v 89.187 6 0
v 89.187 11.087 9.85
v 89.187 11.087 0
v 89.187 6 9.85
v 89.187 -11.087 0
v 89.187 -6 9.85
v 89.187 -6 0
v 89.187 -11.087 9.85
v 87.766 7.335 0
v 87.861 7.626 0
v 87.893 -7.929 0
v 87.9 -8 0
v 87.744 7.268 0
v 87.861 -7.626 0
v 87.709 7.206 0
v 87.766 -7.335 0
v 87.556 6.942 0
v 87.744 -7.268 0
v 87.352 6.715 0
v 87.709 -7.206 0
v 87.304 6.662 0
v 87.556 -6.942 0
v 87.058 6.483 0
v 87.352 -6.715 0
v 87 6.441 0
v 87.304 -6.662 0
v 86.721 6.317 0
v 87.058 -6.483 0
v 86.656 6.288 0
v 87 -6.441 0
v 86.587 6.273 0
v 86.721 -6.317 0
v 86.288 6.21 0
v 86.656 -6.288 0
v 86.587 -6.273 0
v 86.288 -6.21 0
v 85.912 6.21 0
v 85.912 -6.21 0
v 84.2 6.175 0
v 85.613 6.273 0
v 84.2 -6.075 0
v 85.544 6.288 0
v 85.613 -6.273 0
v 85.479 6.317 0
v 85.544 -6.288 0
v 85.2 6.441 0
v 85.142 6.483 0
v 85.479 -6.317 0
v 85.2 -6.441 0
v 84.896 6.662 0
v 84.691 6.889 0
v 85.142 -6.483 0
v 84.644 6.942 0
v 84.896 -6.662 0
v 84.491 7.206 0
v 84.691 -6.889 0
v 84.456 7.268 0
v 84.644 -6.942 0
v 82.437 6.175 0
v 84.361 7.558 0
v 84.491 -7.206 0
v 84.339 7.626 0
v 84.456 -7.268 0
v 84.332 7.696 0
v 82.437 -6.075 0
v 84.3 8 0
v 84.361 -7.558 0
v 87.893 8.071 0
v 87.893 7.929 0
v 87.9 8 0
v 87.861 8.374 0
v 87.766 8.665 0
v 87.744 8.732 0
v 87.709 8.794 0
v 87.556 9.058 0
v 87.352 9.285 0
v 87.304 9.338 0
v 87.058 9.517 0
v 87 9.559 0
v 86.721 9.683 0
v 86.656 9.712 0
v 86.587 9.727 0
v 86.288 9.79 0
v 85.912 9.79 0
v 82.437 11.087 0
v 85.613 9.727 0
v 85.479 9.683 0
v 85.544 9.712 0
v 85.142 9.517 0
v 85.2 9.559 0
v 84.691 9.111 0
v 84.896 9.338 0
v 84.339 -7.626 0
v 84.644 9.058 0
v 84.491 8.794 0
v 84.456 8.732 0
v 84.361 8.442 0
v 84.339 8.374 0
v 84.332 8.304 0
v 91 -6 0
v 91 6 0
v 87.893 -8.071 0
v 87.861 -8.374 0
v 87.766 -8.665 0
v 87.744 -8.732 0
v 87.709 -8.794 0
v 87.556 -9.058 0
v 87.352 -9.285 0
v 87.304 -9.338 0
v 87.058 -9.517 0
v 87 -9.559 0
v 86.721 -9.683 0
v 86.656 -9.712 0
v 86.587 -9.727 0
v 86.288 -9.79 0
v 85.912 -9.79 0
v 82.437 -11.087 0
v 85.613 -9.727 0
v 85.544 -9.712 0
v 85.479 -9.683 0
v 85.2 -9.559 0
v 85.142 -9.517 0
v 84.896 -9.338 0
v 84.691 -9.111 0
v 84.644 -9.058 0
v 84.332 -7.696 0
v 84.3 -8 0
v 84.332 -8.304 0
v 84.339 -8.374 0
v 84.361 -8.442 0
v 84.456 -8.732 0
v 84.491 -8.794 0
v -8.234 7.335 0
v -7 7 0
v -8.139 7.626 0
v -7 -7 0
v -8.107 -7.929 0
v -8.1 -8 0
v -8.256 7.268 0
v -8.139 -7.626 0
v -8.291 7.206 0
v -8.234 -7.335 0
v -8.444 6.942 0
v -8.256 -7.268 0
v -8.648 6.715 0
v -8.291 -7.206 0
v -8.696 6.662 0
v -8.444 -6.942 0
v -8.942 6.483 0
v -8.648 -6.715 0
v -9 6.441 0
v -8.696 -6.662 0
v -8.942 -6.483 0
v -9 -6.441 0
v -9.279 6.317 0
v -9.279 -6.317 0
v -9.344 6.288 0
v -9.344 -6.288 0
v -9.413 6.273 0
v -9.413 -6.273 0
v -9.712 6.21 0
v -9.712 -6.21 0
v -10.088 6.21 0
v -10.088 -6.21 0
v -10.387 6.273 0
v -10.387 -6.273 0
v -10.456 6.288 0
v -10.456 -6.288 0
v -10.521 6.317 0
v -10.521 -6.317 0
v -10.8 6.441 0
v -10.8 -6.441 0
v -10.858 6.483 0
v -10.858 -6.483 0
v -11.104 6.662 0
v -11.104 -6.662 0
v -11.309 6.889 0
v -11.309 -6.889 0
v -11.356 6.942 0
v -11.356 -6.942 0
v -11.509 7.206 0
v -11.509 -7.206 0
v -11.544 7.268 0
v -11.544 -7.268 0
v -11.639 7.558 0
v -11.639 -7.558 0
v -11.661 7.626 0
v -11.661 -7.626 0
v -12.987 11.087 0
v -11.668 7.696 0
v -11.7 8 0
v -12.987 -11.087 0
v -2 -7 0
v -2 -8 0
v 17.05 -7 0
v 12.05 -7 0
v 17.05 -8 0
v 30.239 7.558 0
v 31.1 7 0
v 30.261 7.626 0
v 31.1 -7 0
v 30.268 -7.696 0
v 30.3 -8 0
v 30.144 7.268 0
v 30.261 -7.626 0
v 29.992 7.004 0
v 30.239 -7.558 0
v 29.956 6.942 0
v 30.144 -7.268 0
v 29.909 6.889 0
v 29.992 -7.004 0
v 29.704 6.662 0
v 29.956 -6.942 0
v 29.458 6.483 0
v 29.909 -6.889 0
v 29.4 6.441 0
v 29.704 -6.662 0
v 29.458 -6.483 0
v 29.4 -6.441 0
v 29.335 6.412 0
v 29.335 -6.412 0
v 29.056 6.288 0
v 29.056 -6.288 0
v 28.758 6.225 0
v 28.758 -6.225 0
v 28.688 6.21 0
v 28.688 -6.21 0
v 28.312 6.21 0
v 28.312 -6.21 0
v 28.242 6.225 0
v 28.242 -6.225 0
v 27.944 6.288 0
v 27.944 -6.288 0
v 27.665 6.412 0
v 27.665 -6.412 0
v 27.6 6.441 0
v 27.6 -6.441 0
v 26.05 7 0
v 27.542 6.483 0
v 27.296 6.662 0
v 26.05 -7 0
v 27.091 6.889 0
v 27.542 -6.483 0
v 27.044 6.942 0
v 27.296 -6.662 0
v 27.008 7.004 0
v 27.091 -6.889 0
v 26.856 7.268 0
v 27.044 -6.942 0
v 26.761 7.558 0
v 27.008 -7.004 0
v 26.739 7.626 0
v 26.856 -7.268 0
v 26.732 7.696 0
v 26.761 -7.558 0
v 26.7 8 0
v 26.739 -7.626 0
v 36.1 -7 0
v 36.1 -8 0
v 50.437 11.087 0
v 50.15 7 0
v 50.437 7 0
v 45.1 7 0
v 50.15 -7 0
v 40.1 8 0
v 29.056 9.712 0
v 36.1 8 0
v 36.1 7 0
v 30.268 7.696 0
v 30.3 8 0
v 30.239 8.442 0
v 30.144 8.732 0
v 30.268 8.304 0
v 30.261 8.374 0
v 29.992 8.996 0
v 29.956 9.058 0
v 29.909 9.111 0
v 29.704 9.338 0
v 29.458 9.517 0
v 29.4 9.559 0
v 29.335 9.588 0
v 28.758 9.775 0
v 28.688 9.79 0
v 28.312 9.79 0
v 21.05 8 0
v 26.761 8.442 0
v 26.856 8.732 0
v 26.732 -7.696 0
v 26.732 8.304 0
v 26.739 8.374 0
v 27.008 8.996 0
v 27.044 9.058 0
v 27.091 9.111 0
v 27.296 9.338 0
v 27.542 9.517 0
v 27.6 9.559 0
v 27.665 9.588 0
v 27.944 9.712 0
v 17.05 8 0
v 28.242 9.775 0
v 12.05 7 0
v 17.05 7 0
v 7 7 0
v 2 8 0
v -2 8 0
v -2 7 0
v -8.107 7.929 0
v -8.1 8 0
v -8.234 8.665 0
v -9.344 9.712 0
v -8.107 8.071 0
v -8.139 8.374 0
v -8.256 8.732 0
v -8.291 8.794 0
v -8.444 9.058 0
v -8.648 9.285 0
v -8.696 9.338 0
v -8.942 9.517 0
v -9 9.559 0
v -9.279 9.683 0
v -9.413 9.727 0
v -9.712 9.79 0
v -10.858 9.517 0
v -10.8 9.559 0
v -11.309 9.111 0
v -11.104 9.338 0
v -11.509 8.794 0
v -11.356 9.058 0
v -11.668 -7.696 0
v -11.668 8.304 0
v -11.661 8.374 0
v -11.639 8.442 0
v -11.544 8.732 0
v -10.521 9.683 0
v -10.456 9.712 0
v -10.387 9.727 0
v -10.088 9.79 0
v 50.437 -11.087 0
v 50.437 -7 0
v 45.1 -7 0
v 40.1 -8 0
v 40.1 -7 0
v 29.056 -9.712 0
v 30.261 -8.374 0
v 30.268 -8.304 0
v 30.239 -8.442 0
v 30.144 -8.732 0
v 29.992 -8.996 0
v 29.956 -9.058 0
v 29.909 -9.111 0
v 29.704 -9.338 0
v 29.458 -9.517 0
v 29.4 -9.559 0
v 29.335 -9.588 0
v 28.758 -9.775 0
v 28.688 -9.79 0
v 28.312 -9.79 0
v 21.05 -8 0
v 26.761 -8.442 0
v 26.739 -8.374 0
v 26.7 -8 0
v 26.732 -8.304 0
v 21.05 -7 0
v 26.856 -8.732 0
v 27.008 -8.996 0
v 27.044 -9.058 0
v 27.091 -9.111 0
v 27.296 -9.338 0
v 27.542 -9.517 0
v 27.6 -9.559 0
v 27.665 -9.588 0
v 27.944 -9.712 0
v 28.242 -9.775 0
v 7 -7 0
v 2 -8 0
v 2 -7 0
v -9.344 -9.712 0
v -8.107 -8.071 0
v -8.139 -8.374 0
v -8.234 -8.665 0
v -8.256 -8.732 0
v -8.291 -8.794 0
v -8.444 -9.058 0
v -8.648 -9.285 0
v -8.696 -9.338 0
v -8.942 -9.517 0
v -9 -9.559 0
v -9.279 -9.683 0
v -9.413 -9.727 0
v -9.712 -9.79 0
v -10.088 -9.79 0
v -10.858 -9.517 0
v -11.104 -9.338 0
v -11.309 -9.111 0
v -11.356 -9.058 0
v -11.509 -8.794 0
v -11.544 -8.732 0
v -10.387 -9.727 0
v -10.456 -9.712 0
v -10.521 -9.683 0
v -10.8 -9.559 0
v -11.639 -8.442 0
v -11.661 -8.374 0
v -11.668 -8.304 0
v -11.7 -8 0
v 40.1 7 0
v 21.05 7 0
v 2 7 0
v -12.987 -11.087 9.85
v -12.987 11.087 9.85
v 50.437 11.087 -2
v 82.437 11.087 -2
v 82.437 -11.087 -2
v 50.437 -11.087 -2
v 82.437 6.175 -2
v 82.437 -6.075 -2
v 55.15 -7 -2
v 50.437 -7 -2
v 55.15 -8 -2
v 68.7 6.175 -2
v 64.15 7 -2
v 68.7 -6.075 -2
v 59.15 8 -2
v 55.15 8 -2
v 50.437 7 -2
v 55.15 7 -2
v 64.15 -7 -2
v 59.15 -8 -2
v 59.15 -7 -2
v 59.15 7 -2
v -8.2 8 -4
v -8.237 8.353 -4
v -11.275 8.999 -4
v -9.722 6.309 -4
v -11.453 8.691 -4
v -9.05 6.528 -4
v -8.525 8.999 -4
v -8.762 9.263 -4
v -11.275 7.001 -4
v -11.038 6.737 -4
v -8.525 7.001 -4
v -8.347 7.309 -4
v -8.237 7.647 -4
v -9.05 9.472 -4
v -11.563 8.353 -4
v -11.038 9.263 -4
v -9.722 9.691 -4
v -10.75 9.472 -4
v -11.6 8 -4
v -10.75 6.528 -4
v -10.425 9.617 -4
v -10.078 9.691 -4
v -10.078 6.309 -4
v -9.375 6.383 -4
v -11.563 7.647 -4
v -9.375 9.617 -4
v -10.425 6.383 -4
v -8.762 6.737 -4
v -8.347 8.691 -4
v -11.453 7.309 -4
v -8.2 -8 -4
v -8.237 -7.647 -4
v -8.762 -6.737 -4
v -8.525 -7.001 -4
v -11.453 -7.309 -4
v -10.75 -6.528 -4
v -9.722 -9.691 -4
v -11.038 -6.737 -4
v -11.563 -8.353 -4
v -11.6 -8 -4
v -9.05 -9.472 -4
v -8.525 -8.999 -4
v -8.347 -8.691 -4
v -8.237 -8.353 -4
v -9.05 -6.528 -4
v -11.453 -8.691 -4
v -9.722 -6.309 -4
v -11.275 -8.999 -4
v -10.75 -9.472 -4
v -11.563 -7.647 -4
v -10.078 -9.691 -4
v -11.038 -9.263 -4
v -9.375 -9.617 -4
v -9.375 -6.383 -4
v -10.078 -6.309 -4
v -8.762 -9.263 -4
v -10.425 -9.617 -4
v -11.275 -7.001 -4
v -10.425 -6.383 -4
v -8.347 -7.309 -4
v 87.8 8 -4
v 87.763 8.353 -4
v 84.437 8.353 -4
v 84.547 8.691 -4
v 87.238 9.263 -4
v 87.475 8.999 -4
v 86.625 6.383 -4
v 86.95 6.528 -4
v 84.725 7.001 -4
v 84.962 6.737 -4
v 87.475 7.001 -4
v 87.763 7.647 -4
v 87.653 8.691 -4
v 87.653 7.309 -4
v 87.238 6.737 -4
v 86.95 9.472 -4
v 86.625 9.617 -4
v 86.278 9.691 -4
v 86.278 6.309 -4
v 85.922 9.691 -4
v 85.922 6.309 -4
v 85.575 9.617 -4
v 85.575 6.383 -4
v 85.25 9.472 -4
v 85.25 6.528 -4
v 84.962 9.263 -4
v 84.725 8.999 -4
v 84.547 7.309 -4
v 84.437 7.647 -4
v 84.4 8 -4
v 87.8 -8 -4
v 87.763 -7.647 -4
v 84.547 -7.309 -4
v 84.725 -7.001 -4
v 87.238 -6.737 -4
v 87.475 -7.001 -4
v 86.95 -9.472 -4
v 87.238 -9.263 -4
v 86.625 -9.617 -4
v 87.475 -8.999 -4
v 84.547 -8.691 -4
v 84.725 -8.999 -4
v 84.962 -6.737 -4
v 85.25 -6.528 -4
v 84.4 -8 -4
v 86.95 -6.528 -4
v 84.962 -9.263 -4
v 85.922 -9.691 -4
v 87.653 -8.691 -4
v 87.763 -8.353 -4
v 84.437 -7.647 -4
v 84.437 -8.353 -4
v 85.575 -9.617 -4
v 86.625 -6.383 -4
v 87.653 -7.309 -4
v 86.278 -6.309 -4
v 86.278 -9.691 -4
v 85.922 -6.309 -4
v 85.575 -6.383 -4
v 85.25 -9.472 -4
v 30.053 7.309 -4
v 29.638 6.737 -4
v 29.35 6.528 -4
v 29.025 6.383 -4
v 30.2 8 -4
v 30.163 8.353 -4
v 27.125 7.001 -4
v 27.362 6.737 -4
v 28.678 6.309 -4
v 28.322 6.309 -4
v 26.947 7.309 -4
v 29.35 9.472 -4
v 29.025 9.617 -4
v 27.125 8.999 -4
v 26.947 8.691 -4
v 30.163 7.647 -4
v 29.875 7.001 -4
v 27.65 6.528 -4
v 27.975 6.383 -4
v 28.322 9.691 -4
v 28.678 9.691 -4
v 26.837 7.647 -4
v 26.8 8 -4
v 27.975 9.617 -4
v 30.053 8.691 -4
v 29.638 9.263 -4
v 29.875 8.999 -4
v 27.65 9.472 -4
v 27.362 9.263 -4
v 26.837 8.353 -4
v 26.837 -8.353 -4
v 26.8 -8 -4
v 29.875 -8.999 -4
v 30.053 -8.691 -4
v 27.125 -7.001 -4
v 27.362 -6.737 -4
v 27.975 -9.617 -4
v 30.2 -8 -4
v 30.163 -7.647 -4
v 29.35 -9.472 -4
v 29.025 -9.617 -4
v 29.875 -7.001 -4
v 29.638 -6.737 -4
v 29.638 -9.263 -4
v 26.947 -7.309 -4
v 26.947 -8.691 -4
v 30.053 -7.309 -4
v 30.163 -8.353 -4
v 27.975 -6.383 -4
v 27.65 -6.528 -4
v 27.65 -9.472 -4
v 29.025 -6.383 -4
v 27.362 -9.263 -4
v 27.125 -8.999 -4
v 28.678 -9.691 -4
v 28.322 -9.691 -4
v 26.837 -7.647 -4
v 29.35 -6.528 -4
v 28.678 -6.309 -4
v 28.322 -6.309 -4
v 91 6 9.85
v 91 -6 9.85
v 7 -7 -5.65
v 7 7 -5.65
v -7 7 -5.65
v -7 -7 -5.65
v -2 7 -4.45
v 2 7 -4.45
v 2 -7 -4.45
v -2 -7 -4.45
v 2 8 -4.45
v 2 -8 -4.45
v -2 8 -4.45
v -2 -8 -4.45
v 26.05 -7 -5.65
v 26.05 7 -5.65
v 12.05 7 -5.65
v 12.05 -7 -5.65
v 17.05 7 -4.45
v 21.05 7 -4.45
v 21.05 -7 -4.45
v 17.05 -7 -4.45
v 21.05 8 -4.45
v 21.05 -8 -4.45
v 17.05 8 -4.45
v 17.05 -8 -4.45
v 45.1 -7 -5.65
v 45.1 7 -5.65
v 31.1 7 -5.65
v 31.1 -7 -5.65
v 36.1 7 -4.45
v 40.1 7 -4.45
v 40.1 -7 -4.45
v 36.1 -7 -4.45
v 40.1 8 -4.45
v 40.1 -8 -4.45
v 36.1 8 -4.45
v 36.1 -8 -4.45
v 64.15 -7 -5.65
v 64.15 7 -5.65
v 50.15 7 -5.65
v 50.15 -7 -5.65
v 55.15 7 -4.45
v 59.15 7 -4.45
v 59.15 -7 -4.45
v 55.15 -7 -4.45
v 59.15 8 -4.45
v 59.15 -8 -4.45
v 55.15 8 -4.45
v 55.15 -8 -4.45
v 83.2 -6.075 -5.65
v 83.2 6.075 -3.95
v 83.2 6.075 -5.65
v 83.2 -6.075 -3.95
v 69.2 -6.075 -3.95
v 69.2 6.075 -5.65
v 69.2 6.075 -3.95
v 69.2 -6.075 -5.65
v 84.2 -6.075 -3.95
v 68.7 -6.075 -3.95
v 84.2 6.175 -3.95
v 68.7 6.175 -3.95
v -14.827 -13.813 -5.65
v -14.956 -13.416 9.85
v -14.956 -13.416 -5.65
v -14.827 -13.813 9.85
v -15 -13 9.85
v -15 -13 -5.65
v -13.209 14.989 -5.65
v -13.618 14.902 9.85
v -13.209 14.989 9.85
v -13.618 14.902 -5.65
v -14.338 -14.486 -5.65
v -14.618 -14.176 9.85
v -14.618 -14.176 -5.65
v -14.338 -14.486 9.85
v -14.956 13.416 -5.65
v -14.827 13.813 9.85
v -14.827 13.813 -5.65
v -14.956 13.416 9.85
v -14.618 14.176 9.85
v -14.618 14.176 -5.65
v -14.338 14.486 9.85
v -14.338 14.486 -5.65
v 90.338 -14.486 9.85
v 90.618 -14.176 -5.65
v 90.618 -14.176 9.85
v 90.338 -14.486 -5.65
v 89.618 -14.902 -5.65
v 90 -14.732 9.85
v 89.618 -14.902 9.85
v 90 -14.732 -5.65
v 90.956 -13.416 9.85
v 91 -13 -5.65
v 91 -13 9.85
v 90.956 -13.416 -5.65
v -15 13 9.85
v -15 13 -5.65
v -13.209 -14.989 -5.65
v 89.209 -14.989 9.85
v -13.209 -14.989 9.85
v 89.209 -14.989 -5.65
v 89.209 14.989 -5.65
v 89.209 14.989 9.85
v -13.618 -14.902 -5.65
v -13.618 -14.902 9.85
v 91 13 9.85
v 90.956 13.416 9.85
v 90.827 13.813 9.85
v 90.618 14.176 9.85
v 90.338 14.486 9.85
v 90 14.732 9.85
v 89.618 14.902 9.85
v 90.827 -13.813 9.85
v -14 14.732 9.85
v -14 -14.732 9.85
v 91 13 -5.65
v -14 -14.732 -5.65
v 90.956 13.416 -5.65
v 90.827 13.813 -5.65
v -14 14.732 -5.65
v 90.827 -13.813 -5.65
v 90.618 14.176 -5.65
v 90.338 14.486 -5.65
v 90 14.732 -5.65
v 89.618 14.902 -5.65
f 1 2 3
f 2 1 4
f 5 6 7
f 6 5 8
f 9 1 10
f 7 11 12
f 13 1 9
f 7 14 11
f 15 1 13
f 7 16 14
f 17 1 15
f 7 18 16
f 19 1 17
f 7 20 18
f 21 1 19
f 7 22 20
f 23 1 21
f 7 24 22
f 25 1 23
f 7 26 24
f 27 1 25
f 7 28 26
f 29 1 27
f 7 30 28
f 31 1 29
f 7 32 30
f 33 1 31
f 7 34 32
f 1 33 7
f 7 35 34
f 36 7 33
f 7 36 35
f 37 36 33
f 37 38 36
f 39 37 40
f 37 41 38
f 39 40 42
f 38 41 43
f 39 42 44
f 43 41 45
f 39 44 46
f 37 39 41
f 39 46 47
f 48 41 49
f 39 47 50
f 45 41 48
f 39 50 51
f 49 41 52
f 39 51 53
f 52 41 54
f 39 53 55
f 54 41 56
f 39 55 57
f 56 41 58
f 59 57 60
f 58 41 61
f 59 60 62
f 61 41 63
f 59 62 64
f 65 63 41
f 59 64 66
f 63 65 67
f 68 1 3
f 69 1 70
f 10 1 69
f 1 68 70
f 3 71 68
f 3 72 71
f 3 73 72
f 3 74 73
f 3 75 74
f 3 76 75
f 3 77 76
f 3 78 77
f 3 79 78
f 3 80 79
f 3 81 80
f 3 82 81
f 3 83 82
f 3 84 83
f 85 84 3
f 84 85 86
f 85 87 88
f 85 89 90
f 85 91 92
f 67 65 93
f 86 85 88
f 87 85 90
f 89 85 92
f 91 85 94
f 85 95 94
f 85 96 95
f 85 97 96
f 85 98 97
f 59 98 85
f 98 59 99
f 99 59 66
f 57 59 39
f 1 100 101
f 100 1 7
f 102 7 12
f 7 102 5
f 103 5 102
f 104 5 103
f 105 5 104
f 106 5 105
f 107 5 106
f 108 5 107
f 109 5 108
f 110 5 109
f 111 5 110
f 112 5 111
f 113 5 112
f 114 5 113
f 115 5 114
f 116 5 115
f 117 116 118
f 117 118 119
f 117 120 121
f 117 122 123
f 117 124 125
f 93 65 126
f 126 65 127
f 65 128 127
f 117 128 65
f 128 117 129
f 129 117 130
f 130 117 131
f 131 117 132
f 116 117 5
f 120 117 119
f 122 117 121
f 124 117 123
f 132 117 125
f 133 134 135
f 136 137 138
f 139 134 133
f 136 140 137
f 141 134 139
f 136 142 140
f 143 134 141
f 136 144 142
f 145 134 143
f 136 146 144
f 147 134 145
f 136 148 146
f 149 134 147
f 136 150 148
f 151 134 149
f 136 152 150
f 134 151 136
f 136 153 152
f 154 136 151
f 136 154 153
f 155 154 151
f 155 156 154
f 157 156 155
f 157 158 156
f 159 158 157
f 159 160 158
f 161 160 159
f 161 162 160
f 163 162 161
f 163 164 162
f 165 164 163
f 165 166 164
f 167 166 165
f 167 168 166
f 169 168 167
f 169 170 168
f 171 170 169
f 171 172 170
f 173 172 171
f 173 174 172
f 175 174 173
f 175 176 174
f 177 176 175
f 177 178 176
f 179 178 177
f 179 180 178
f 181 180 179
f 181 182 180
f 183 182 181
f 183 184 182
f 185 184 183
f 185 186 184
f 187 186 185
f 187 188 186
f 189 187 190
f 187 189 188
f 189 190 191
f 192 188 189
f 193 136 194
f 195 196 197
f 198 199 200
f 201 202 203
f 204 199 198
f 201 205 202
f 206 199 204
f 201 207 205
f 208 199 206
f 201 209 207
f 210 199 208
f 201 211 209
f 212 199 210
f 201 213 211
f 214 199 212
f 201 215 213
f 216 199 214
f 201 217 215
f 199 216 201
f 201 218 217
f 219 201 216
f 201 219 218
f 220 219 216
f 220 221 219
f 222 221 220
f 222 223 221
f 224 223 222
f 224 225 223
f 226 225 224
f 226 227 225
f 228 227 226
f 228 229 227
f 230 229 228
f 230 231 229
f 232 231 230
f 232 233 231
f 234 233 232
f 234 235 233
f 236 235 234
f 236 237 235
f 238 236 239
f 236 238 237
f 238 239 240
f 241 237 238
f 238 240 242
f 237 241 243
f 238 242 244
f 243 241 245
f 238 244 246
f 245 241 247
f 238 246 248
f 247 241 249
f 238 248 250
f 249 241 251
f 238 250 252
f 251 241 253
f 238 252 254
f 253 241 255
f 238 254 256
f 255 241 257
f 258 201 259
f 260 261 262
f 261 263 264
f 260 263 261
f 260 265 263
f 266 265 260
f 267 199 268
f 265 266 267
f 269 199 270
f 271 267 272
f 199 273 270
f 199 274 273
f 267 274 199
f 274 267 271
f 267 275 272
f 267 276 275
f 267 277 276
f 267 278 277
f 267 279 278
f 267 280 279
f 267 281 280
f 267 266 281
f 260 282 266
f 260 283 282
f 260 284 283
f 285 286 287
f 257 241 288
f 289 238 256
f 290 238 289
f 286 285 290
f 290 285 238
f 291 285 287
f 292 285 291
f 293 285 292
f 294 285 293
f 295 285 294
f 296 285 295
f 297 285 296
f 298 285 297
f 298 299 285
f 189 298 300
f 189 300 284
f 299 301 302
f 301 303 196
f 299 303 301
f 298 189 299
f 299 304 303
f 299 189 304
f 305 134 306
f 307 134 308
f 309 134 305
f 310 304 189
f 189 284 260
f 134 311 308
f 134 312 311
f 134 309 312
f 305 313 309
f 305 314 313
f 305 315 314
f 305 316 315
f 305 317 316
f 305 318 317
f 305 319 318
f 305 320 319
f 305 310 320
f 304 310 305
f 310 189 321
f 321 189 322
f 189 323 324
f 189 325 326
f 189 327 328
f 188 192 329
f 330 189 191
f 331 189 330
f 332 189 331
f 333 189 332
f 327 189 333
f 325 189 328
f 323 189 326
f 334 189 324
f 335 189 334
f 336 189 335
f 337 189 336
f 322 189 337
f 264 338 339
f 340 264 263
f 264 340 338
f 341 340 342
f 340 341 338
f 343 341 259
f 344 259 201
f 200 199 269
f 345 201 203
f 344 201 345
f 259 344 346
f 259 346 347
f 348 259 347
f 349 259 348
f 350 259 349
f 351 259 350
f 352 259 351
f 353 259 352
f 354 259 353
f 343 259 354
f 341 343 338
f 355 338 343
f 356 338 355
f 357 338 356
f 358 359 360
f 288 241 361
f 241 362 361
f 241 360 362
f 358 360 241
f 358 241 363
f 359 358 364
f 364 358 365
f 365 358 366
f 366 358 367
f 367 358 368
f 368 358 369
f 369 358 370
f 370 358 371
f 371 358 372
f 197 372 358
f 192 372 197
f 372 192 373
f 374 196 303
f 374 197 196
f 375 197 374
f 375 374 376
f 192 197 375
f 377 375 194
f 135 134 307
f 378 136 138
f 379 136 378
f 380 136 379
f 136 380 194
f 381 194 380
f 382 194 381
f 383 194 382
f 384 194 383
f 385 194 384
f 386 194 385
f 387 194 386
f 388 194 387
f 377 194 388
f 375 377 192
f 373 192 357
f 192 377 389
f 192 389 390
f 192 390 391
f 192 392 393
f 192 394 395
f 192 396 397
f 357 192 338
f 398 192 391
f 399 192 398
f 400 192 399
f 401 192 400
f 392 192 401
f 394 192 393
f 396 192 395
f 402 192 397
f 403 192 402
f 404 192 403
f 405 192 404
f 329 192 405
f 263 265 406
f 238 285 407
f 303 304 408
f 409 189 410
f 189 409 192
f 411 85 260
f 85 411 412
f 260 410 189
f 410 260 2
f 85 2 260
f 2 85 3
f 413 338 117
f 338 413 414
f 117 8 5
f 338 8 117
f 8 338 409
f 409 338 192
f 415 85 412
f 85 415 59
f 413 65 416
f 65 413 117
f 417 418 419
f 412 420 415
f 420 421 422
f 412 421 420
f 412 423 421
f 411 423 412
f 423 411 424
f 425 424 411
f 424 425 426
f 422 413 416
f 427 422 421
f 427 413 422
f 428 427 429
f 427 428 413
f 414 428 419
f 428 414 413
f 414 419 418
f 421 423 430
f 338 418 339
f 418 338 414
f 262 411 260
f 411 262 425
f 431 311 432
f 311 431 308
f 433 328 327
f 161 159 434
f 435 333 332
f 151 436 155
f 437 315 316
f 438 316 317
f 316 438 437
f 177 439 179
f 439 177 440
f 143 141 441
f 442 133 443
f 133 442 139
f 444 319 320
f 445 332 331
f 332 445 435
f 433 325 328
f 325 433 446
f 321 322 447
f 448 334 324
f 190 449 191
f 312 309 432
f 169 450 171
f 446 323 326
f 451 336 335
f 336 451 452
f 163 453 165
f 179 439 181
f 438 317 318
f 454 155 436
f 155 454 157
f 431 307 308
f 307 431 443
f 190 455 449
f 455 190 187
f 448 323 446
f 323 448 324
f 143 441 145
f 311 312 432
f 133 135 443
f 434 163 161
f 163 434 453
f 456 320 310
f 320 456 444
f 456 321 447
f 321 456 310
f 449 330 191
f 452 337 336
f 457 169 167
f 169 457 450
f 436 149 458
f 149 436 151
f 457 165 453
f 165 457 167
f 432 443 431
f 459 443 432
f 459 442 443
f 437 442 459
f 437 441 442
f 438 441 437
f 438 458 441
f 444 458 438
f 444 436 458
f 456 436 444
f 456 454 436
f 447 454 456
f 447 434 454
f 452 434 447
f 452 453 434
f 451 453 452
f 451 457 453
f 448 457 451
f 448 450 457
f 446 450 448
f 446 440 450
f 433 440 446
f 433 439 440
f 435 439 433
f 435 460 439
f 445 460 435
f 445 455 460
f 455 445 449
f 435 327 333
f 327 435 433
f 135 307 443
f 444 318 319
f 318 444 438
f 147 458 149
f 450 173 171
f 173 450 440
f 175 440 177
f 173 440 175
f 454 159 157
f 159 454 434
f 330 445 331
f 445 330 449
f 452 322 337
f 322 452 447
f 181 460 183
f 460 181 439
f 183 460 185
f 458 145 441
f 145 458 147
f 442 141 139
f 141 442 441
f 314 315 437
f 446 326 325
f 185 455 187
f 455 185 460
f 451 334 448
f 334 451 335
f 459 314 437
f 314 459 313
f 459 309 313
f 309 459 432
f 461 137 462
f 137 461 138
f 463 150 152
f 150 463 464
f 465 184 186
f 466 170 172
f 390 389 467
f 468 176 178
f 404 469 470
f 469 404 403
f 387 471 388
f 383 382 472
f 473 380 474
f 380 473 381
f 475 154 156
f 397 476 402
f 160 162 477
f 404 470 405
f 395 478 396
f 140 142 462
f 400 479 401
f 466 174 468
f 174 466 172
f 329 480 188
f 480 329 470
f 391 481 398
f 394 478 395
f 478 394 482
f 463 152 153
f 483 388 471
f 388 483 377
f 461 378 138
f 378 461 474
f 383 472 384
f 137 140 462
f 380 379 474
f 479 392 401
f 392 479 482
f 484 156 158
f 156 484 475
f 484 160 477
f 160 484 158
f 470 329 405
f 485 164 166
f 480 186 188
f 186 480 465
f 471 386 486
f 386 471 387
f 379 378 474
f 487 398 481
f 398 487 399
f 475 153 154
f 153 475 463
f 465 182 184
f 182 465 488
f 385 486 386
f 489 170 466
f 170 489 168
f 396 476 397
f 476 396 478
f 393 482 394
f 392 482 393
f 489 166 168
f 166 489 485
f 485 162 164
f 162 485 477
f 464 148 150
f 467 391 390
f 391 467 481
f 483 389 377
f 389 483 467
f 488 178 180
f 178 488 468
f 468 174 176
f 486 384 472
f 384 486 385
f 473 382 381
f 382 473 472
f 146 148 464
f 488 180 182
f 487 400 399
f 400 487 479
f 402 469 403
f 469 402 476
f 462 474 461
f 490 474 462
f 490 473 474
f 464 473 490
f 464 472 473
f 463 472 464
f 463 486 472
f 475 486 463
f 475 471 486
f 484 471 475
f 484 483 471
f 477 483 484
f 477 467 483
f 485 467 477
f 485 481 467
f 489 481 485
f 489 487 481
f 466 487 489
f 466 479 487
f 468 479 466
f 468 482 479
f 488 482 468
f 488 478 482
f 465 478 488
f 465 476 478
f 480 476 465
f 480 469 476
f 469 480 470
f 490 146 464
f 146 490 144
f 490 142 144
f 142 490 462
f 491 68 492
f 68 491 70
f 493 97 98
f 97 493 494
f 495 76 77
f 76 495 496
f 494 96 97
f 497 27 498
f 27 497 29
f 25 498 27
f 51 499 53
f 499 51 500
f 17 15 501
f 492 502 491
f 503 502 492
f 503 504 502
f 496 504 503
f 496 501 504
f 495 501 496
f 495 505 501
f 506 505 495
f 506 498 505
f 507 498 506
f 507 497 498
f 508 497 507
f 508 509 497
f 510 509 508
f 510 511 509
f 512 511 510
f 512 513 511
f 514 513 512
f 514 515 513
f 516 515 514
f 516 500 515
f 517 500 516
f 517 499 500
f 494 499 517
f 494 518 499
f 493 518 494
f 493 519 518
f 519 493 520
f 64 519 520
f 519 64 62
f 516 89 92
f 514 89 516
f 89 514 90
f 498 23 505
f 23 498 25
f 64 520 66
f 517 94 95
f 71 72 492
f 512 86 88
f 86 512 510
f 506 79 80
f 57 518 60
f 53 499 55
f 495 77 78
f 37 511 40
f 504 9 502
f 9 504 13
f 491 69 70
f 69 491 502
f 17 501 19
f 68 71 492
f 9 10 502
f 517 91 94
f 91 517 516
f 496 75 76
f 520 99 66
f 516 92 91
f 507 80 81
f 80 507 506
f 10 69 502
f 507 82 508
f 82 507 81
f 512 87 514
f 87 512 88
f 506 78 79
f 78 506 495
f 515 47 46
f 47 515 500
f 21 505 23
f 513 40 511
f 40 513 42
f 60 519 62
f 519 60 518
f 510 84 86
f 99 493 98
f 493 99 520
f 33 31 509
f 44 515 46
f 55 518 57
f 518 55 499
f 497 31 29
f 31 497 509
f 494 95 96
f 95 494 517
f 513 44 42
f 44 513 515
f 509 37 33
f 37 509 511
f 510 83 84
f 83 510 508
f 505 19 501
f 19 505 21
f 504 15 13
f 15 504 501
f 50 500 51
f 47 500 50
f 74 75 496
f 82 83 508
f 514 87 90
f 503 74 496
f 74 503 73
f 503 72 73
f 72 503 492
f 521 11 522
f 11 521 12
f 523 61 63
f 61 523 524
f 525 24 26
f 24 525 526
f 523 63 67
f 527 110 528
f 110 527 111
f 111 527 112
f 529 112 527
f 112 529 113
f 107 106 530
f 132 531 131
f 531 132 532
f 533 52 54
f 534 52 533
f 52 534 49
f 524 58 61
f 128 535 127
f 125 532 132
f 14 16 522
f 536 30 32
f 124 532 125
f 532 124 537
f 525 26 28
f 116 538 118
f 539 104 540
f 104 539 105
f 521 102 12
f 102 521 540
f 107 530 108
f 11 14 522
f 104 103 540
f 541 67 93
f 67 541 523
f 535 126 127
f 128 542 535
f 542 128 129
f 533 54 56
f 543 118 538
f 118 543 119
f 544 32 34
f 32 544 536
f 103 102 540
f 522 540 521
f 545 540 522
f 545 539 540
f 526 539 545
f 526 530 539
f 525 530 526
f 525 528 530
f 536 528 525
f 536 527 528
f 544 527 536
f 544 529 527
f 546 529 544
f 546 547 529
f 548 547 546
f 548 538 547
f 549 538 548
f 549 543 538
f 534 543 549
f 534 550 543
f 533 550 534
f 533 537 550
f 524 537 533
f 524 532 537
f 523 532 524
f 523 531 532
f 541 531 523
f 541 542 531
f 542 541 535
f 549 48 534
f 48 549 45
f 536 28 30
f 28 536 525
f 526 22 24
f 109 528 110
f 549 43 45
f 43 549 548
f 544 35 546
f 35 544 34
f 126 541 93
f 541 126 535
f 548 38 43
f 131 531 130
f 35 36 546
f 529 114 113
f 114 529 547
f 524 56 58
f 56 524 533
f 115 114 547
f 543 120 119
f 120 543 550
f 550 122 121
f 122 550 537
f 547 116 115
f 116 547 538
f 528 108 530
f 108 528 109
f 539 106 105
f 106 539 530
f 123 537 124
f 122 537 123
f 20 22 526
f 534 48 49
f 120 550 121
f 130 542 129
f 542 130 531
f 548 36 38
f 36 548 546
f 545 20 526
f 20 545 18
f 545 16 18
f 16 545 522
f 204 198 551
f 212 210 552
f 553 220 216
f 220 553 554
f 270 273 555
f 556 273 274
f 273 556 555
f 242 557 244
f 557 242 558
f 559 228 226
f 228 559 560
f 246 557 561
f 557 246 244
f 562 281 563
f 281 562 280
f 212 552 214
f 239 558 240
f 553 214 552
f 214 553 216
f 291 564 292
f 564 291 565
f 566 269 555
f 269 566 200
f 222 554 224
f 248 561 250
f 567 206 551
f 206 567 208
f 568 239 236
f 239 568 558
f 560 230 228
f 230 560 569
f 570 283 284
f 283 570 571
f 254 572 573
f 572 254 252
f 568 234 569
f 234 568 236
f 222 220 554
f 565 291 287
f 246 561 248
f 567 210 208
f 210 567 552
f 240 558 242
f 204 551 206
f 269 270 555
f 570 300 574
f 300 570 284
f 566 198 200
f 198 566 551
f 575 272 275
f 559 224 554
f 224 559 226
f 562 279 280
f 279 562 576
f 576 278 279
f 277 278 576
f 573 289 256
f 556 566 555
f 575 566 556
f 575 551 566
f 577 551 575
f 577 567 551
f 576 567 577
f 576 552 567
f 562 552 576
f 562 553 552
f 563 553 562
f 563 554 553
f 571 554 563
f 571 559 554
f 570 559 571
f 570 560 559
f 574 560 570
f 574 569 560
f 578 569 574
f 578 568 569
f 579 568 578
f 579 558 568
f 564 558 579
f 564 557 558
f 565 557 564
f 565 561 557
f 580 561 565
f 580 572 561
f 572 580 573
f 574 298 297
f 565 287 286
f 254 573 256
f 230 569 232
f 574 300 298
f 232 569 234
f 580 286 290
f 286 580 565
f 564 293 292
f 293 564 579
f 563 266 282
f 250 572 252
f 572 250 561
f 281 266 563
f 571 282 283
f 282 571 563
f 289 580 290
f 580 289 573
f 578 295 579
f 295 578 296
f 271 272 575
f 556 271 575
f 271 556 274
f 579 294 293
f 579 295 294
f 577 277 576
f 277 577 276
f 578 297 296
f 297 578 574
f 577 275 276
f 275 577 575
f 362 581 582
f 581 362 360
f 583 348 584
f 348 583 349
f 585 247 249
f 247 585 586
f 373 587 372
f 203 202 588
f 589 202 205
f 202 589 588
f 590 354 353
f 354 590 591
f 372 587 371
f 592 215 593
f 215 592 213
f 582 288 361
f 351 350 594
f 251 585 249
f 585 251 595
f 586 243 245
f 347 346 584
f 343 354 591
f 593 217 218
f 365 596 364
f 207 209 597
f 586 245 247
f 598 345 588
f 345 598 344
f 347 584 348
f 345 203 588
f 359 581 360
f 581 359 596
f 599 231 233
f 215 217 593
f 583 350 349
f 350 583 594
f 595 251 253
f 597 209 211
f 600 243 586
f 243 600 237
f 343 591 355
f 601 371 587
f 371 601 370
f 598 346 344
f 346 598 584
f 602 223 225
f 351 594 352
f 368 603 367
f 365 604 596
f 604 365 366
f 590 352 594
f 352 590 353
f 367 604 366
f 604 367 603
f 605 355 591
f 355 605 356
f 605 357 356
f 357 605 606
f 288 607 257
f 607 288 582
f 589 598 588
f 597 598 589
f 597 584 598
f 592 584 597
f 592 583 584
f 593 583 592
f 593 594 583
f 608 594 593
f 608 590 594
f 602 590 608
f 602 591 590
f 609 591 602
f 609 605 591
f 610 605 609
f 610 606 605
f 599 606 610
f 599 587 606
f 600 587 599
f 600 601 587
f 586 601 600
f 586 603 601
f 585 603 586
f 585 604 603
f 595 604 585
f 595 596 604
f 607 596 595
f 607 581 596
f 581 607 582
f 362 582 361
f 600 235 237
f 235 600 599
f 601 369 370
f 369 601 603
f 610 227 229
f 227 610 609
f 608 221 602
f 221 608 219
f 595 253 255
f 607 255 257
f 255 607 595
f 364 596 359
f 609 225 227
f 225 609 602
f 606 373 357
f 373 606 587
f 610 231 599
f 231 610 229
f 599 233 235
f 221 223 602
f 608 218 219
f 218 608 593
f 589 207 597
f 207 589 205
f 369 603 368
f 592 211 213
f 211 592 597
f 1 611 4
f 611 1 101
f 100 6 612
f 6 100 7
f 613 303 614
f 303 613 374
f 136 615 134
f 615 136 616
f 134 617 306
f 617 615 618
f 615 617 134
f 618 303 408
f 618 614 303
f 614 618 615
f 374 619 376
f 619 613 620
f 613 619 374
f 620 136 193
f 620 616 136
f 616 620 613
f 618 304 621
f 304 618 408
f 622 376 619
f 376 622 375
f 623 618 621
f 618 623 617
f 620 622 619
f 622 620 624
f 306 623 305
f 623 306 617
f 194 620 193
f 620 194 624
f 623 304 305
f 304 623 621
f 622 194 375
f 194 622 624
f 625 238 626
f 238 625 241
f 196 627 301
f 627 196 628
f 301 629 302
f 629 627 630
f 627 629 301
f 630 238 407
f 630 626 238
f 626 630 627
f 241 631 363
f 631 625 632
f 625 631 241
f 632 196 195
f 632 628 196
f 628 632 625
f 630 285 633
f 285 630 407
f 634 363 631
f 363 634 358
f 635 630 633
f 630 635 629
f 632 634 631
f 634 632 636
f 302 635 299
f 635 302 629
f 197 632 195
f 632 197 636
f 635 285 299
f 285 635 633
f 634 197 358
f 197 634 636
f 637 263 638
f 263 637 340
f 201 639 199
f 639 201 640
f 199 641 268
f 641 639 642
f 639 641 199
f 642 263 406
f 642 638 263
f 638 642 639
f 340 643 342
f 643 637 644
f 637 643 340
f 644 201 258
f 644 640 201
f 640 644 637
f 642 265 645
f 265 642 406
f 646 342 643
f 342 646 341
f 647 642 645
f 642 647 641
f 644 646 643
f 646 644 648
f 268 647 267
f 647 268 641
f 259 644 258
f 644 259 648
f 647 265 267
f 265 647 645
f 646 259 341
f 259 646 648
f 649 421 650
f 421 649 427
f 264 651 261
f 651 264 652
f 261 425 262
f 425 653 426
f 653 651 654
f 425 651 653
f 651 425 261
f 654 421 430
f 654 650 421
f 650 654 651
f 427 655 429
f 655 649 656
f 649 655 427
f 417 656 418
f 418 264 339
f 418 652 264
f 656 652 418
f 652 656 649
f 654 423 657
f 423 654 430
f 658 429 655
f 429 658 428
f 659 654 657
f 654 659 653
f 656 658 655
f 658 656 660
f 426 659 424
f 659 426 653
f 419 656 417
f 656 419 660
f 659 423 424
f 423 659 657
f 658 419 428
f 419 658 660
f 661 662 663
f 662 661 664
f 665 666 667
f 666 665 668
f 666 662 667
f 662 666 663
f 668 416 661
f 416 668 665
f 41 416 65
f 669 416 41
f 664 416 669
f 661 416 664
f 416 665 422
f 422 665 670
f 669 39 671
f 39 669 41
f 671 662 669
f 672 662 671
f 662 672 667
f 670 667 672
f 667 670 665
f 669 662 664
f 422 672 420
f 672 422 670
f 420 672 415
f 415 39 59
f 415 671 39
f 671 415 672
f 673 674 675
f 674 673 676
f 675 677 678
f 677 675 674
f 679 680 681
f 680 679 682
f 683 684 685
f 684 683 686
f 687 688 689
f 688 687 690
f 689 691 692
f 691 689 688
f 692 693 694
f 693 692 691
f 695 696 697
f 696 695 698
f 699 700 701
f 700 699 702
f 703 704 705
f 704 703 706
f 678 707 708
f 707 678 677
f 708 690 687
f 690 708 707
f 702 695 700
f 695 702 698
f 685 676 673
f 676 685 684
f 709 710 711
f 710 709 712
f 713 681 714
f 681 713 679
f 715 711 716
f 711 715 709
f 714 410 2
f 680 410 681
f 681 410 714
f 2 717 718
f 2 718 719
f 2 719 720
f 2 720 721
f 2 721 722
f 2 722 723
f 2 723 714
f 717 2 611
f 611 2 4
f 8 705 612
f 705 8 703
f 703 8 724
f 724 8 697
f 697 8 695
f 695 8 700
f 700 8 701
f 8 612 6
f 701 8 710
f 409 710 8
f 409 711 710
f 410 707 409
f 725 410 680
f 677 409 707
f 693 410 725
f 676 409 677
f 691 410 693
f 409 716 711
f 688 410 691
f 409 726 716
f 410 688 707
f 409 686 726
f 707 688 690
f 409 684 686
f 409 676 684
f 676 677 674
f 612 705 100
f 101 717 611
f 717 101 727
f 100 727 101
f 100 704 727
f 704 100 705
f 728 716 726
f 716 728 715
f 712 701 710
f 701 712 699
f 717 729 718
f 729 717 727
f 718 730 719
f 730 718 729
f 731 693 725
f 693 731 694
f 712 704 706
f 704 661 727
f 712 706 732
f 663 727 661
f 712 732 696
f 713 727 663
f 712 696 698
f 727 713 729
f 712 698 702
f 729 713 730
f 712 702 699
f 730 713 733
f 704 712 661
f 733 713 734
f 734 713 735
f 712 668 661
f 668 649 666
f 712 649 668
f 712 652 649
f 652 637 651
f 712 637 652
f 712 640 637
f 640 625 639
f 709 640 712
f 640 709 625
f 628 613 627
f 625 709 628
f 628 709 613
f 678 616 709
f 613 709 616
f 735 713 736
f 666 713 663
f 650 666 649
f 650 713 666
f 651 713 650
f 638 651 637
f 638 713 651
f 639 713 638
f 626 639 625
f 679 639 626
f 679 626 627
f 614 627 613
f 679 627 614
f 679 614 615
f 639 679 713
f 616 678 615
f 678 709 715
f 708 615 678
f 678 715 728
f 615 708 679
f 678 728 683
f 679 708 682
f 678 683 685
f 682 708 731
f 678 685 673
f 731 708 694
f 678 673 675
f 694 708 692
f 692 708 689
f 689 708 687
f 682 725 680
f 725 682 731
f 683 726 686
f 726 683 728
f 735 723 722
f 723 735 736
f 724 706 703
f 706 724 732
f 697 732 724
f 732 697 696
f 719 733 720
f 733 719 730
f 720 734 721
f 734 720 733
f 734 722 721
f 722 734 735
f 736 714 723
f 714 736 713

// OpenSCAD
/* Notes:
 * - my M2 heat set nuts, the shortest ones, are 3.5mm in diameter and 4mm
 *   long.
 * - stock miniMACRO5 shell leaves 5mm from top face to where the PCB hits
 *   the plastic underneath. Mill-max sockets supposedly take up an additional
 *   0.64mm of space above the board.
 * - rotary encoders only need about 12.25mm in the Y.
 */

$fn=30;

// translate([0,0,-5]) import("./orig/miniMACRO5.stl");
enclosure();
// bottomPlate();
// rotate([180,0,0]) translate([0,0,15-5-2]) bottomPlate();

module enclosure() {
   difference() {
      simpleBody(ht=15.5);
      pcbPlus(ht=20);
      switchHoles();
   }

}

//Thickness of entire plate
plateThickness=4.8;
//Unit square length, from Cherry MX data sheet
lkey=19.05;
//Hole size, from Cherry MX data sheet
holesize=14;
//length, in units, of board
width=15;
//Height, in units, of board
height=1;

//calculated vars

holediff=lkey-holesize;
w=width*lkey;
h=height*lkey;

//
// THINGS TO PRINT - s is a switch, r a rotary encoder
//
module miniHoles() {
   mm5 = [
         //start ROW 0
         [[0,0],1,"s"],
         [[1,0],1,"s"],
         [[2,0],1,"s"],
         [[3,0],1,"s"],
         [[4,0],1,"r"],
         ];

   holematrix(mm5,0,h-lkey);
}

module switchhole(size=1,openable=0,switch=1){
    translate([0,0,-0.1]) union(){
        if (switch) {
           cube([holesize,holesize,plateThickness+0.4+0.65]);
           translate([holesize/2-2,-1,1.3]) cube([4,holesize+2,plateThickness+0.4 - 1.3+0.65]); // for clip to catch
        }
        else /* encoder */ {
           translate([0,(holesize-12.15)/2,0]) {
              cube([holesize, 12.15, plateThickness+0.4]);
              translate([-0.5,0,1.8]) cube([holesize+1.5, 12.25, plateThickness+0.4]);
           }
        }
    }
}

module holematrix(holes,startx,starty){
    for (key = holes){
        translate([startx+lkey*key[0][0], starty-lkey*key[0][1], 0])
        translate([(lkey*key[1]-holesize)/2,(lkey - holesize)/2, 0])
        switchhole(size=key[1],switch=(key[2] == "s" ? 1 : 0));
    }
}


module bottomPlate() {
   ht = 1.5; // was 2.0
   gap = 0.2;
   postHt = 7.0;
   postDia = 5.5;

   difference() { 
      union() {
         /* make the whole bottom thick in anticpation of cutting out a space for
          * the microcontroller
          */
         translate([-12.987+gap,-11.087+gap,-1*(5-ht)])
            cube([12.987+89.187-2*gap,11.087*2-2*gap,5]);

         /* these add in the USB-side corners, which don't work for nice!nano */
         if (0) translate([84.5,-11.087+gap,-1*(postHt-ht)])
            cube([89.187-gap-84.5,11.087*2-2*gap,postHt-ht+0.1]);

         /* posts, now with squared outside edges for more material */
         translate([-9.9,8,-1*(postHt-ht)]) {
            cylinder(d=postDia,h=5.0);
            translate([0,postDia/4,5/2]) cube([postDia,postDia/2,5],center=true);
         }
         translate([-9.9,-8,-1*(postHt-ht)]) {
            cylinder(d=postDia,h=5.0);
            translate([0,-postDia/4,5/2]) cube([postDia,postDia/2,5],center=true);
         }
         translate([28.5,8,-1*(postHt-ht)]) {
            cylinder(d=postDia,h=5.0);
            translate([0,postDia/4,5/2]) cube([postDia,postDia/2,5],center=true);
         }
         translate([28.5,-8,-1*(postHt-ht)]) {
            cylinder(d=postDia,h=5.0);
            translate([0,-postDia/4,5/2]) cube([postDia,postDia/2,5],center=true);
         }
      }

      /* microcontroller cutout */
      translate([62-12.987+gap,-11.087+gap+1,-1*(5-ht)-gap])
         cube([38.75,11.087*2-2*gap-2,5-ht+0.1+gap]);
     

      /* USB cutout */
      translate([85,-5.5,-20.0]) cube([20,11,25.5]);

      /* reset cutout */
      translate([-12.987+gap+20.0,11.087-5,-5+ht-0.1])
         cube([5,5,10]);
      translate([-12.987+gap+20.0+2.5,11.087-5,-5+ht-0.1])
         cylinder(d=5,h=10);
      translate([-12.987+gap+20.0-2.5,11.087-5-4,-5+ht-0.1])
         cube([10,10,3]);

      /* end screw holes with caps (make < -5.2 if needed to fill hole) */
      translate([-9.9,8,-8.3]) cylinder(d=2.25,h=8.0);
      translate([-9.9,8,0]) cylinder(d=4,h=2.1);

      translate([-9.9,-8,-8.3]) cylinder(d=2.25,h=8.0);
      translate([-9.9,-8,0]) cylinder(d=4,h=10);

      /* USB side screw holes with caps -- omit in bottom */
      if (0) {
         translate([86.1,8,-8.3]) cylinder(d=2.25,h=8.0);
         translate([86.1,8,0]) cylinder(d=4,h=10);
         translate([86.1,-8,-8.3]) cylinder(d=2.25,h=8.0);
         translate([86.1,-8,0]) cylinder(d=4,h=10);
      }
   
      /* middle screw holes */
      translate([28.5,8,-8.3]) cylinder(d=2.25,h=8.0);
      translate([28.5,8,0]) cylinder(d=4,h=10);
      translate([28.5,-8,-8.3]) cylinder(d=2.25,h=8.0);
      translate([28.5,-8,0]) cylinder(d=4,h=10);

   }
}

module pcbPlus(ht=1) {
   translate([-12.987,-11.087,0]) cube([12.987+89.187,11.087*2,ht]);

   /* cutout to account for solder points for arduino riser */
   translate([89.187-35-3.75,-11.087,-2.0]) cube([32,11.087*2,ht+1.5]);

   /* screws, heat set inserts */
   translate([-9.9,8,-4]) cylinder(d2=3.65, d1=3.4,h=5);
   translate([-9.9,-8,-4]) cylinder(d2=3.65, d1=3.4,h=5);
   translate([86.1,8,-4]) cylinder(d2=3.65, d1=3.4,h=5);
   translate([86.1,-8,-4]) cylinder(d2=3.65, d1=3.4,h=5);

   /* middle screw/heat set inserts */
   translate([28.5,8,-4]) cylinder(d2=3.65, d1=3.4,h=5);
   translate([28.5,-8,-4]) cylinder(d2=3.65, d1=3.4,h=5);

   /* USB */
   translate([80,-6,0.0]) cube([20,12,10.5]);
}

module simpleBody(ht=10.5) {
   if (0) {
      /* 5.65mm accounts for mill-max sockets */
      translate([0,0,-5.65]) linear_extrude(height=ht)
         polygon(points=[[-16,-14],[-16,14],[92,14],[92,-14]]);
   }
   else {
      translate([0,0,-5.65]) linear_extrude(height=ht)
         hull() {
            translate([-13,-13,0]) circle(r=2);
            translate([-13,13,0]) circle(r=2);
            translate([89,-13,0]) circle(r=2);
            translate([89,13,0]) circle(r=2);
         }
   }
}

module switchHoles() {
   translate([-7.15-2.525+0.15,-7.15-2.525+0.15,-5.65]) miniHoles();
}
